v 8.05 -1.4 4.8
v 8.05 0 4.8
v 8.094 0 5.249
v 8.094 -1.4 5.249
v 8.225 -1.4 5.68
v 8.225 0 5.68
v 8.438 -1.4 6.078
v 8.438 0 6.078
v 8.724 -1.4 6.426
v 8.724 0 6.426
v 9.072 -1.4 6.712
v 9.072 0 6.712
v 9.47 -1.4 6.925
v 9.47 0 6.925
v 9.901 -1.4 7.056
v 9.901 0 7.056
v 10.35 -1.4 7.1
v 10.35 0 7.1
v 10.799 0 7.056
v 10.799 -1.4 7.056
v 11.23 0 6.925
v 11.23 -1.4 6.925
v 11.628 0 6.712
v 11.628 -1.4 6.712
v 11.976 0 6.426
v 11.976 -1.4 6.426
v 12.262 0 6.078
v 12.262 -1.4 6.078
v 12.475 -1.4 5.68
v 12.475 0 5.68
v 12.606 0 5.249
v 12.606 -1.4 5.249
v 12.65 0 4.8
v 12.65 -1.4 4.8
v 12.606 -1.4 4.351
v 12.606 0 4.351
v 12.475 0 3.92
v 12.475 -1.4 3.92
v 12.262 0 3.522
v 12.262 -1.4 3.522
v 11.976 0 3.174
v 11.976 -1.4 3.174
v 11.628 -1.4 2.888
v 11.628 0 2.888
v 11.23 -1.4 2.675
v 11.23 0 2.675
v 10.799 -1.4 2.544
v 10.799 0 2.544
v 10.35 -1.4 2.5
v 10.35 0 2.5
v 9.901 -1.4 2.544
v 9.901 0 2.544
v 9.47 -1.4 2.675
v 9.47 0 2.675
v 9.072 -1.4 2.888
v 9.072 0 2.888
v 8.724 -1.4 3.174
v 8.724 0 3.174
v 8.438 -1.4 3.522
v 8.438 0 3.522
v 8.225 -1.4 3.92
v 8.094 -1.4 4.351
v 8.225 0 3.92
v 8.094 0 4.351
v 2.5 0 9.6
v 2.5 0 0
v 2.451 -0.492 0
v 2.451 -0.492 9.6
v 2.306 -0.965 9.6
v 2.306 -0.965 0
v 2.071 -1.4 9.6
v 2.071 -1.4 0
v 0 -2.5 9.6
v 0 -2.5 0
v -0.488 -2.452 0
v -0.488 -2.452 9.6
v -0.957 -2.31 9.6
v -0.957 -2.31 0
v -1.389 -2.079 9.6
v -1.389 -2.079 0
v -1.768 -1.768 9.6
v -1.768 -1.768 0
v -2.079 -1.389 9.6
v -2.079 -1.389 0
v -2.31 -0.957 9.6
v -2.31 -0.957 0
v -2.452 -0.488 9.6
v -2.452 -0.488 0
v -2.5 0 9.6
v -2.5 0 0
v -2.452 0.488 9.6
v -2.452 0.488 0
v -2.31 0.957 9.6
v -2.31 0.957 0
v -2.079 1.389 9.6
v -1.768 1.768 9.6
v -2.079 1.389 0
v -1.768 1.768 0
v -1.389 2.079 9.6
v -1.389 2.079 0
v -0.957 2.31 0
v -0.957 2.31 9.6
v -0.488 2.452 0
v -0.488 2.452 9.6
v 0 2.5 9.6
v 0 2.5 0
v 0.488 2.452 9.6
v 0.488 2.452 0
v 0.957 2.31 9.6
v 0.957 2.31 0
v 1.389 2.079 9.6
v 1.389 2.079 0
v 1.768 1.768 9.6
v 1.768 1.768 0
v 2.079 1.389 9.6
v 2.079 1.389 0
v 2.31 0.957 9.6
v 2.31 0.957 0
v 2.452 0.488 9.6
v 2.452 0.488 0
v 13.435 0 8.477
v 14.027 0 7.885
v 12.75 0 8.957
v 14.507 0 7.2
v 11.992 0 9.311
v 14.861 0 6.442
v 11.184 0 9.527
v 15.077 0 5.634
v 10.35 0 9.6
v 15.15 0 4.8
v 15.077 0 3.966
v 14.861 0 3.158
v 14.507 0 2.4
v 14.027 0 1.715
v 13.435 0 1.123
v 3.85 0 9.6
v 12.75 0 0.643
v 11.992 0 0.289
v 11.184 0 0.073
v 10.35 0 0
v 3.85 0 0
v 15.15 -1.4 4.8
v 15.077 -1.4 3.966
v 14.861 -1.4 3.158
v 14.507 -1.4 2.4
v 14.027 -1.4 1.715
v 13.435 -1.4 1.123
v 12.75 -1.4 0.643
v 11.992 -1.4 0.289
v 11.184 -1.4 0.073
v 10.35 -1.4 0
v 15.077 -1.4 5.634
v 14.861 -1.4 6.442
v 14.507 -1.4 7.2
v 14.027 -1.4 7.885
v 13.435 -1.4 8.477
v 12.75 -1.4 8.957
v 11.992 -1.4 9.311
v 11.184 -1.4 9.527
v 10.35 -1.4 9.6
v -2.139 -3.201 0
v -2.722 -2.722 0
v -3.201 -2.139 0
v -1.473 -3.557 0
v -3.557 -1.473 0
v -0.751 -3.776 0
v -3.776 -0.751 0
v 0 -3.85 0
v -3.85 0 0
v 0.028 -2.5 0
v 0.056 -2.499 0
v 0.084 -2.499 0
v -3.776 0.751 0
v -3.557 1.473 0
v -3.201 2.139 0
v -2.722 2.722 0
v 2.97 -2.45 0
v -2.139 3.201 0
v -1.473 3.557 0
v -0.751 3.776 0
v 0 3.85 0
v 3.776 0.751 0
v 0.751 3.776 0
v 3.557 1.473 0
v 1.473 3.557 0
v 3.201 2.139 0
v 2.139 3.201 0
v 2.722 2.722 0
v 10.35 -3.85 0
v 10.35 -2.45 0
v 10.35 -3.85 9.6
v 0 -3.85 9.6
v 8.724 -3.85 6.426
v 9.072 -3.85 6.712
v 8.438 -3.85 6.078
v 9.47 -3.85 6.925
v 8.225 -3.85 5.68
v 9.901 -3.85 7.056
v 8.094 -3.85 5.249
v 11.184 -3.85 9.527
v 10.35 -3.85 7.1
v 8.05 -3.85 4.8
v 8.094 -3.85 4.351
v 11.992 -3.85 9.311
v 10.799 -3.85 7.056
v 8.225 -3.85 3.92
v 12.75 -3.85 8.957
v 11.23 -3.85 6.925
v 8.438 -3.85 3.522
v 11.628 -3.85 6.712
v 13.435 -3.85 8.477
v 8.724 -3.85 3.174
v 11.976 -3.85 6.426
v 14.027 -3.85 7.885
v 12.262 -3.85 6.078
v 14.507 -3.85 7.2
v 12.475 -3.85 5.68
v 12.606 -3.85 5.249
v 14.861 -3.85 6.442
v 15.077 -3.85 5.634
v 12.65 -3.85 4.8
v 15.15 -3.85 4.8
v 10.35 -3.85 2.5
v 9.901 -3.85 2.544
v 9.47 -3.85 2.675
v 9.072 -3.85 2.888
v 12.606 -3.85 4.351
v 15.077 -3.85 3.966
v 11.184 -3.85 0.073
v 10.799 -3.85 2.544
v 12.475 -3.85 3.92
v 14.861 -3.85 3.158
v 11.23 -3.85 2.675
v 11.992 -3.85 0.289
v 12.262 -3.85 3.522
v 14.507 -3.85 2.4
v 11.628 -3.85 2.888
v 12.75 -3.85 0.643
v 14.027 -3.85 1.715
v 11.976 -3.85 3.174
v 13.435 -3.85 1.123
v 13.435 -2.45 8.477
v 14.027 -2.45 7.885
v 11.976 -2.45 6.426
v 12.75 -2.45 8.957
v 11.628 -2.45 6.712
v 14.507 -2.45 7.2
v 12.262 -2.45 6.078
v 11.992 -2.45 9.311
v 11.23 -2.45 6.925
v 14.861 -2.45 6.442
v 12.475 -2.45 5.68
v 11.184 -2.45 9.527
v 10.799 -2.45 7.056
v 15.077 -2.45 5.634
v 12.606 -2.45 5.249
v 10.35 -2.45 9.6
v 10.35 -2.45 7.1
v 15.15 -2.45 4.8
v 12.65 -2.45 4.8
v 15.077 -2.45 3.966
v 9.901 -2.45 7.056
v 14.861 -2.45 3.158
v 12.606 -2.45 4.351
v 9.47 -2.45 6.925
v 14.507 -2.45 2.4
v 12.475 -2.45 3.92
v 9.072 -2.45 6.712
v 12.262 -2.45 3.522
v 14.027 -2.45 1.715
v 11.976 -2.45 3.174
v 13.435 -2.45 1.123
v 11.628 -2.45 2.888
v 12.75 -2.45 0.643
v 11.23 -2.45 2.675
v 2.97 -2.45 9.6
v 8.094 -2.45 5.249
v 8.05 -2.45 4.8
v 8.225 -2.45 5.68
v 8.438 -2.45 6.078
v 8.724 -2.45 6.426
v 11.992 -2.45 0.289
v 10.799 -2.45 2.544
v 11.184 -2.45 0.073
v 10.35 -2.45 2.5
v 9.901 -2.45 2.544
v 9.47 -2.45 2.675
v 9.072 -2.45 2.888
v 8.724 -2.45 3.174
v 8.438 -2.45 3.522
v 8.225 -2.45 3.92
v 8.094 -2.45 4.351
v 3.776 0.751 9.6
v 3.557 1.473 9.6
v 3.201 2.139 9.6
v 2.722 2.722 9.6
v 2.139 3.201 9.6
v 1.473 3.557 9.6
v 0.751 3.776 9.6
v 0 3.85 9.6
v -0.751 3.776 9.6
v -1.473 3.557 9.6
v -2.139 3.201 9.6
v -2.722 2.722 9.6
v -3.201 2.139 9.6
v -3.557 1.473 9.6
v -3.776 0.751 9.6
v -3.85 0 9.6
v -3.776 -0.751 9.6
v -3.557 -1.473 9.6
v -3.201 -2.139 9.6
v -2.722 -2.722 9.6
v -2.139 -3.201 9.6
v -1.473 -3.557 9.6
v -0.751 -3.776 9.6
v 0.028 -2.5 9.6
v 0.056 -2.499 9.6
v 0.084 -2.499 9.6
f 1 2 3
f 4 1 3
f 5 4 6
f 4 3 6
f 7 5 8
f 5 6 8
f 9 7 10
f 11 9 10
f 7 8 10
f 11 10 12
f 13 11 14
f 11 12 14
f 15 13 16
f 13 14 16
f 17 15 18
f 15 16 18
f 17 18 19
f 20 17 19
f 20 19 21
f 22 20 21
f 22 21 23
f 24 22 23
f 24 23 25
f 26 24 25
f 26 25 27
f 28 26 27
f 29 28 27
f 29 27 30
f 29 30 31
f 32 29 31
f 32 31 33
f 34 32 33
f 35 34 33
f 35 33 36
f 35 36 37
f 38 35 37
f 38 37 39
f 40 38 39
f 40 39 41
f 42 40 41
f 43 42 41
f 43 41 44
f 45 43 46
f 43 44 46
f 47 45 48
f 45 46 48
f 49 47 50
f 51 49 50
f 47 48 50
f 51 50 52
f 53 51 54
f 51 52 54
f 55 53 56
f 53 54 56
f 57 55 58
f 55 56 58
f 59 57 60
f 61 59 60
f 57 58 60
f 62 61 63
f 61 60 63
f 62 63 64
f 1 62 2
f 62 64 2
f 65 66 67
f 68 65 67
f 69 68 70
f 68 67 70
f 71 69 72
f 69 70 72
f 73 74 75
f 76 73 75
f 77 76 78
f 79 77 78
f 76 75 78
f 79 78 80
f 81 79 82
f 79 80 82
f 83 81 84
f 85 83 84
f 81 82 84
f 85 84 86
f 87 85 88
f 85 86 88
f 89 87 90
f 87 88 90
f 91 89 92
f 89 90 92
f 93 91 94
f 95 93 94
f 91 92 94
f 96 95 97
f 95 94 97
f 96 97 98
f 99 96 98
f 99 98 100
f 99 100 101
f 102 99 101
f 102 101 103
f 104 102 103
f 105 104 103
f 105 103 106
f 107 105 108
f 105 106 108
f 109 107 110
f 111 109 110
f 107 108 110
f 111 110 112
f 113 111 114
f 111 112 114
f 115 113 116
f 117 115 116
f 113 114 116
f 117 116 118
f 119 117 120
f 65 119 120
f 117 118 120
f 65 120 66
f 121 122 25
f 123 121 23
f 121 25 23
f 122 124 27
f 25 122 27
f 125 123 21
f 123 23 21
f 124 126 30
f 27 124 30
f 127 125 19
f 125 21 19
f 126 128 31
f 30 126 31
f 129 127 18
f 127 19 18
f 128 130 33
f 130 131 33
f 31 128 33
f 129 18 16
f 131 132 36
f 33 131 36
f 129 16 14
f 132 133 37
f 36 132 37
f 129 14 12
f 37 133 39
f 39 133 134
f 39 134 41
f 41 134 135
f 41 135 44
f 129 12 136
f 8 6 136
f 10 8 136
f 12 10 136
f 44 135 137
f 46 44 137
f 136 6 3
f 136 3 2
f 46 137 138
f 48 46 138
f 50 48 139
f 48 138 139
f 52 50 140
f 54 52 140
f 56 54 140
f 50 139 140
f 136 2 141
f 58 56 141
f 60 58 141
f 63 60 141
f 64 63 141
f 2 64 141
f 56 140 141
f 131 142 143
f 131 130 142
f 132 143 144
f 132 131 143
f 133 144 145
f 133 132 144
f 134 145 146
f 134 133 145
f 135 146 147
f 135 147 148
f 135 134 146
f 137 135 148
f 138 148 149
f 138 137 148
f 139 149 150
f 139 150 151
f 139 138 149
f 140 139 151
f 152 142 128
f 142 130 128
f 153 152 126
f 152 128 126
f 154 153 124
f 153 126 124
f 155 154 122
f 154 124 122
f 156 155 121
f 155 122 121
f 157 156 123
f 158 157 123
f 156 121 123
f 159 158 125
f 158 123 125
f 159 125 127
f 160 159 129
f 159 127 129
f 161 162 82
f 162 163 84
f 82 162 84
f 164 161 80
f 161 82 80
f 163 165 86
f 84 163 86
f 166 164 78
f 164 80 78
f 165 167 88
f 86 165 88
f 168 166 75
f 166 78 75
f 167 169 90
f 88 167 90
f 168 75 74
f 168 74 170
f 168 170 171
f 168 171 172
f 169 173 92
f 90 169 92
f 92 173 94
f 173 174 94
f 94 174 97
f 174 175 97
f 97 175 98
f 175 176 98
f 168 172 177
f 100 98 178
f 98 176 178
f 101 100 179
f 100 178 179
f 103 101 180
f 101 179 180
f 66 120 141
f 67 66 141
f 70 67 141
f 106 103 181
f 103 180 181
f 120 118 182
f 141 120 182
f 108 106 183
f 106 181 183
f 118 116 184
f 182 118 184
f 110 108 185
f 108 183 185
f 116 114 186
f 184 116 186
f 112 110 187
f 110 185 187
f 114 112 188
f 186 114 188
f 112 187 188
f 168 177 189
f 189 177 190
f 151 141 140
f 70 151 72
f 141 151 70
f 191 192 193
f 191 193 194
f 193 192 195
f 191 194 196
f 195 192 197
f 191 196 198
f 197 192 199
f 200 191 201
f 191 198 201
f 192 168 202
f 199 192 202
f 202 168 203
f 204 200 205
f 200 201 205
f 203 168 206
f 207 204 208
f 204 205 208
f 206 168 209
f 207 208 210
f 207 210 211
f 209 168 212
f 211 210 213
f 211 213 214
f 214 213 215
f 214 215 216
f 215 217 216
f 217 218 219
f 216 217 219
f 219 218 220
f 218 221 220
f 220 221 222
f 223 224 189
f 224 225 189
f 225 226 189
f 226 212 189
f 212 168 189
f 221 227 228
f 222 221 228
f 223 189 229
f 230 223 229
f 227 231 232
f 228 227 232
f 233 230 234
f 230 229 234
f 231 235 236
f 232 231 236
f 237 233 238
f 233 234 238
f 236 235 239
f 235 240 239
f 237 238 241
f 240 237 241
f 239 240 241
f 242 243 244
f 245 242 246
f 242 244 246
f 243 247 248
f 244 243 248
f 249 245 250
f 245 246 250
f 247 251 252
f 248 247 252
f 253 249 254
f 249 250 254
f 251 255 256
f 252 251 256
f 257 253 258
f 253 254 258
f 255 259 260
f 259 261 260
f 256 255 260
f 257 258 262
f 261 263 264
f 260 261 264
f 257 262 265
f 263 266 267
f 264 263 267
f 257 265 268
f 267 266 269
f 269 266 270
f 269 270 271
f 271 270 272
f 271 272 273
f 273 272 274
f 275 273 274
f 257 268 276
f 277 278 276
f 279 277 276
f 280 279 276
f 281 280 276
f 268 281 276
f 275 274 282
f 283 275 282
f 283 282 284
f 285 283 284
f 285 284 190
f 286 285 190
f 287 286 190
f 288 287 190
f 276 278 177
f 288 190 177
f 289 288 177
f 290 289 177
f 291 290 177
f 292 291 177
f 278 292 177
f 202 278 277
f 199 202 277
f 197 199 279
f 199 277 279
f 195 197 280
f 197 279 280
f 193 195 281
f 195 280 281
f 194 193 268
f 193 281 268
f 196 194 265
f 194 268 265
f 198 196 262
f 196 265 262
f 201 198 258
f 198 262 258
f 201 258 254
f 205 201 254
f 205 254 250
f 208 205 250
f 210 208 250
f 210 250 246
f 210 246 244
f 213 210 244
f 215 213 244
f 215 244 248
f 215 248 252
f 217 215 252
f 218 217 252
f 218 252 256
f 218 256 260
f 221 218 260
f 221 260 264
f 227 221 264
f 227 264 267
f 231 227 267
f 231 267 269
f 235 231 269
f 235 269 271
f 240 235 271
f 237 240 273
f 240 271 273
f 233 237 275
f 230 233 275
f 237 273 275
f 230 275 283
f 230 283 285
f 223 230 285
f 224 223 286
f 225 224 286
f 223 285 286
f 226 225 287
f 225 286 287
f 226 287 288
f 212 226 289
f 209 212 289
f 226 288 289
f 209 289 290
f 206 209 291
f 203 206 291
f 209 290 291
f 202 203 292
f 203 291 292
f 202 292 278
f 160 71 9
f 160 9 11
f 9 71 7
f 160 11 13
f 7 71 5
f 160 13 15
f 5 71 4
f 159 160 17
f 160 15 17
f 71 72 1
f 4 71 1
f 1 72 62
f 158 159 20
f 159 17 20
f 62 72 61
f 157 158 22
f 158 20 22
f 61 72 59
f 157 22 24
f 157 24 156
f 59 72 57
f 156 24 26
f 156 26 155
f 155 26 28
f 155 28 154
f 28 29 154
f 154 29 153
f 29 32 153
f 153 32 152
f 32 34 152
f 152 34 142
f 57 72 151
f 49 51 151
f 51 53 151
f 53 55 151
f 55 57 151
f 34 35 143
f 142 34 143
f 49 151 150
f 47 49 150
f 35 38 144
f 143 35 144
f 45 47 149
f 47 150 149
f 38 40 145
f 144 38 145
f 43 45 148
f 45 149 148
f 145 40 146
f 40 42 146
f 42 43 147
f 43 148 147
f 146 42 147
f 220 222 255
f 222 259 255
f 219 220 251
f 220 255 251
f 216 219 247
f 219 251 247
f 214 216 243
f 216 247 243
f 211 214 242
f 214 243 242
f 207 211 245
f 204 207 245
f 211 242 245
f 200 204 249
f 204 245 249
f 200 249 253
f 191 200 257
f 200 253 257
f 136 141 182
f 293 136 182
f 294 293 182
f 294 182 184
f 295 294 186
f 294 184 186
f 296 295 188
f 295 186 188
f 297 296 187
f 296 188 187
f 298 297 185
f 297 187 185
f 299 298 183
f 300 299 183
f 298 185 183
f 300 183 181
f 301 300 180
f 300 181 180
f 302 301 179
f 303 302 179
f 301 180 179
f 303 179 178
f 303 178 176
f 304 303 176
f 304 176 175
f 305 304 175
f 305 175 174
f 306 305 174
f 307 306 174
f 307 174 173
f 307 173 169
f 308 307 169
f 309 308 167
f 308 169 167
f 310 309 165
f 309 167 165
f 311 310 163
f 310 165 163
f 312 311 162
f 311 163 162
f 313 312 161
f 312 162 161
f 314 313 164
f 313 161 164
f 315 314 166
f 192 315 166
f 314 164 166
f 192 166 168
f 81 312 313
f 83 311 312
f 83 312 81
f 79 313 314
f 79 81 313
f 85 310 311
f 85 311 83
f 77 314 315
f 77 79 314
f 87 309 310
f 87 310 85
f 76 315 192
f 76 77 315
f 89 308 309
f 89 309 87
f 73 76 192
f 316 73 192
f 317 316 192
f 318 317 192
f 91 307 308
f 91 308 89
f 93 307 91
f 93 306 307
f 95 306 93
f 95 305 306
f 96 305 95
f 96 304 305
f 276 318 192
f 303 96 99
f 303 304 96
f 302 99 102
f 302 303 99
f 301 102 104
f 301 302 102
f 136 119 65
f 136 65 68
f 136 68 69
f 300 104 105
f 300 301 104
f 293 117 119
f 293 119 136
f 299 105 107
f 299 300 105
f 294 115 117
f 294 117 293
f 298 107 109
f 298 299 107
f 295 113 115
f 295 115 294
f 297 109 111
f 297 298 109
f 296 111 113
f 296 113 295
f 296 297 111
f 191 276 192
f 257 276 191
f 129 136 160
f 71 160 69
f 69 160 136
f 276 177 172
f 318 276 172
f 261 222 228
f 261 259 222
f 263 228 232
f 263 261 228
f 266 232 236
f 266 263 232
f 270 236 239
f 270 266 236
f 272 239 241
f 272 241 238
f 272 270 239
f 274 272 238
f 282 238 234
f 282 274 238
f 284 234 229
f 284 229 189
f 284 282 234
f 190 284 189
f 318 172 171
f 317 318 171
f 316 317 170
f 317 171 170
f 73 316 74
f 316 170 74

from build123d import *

# Parameters (mm, degrees)
BOSS_EXTRUDE1_DEPTH = 9.6
FILLET1_R           = 4.8
SKETCH2_R           = 2.3
CUT_EXTRUDE1_DEPTH  = 10


with BuildPart() as part:
    # Sketch1 → Boss-Extrude1 (new body)
    with BuildSketch(Plane.XY):
        with BuildLine():
            ThreePointArc((3.85, 0), (-2.722361108, 2.722361108), (0, -3.85))
            Line((0, -3.85), (15.15, -3.85))
            Line((15.15, -3.85), (15.15, -2.45))
            Line((15.15, -2.45), (2.969848481, -2.45))
            Line((2.969848481, -2.45), (0.084155525, -2.498583168))
            ThreePointArc((0.084155525, -2.498583168), (0.042083726, -2.499645767), (0, -2.5))
            ThreePointArc((0, -2.5), (-1.767766953, 1.767766953), (2.5, 0))
            ThreePointArc((2.5, 0), (2.390405697, -0.732093302), (2.071231518, -1.4))
            Line((2.071231518, -1.4), (15.15, -1.4))
            Line((15.15, -1.4), (15.15, 0))
            Line((15.15, 0), (3.85, 0))
        make_face()
    extrude(amount=BOSS_EXTRUDE1_DEPTH)

    # Fillet1
    fillet1_edges = [part.edges().sort_by_distance(p)[0] for p in [
        (15.15, -0.7, 0),
        (15.15, -0.7, 9.6),
        (15.15, -3.15, 0),
        (15.15, -3.15, 9.6),
    ]]
    fillet(fillet1_edges, radius=FILLET1_R - 0.0001)  # a hair under: the kernel refuses the full size

    # Sketch2 → Cut-Extrude1 (cut)
    with BuildSketch(Plane(origin=(0, 0, 0), x_dir=(1, 0, 0), z_dir=(0, 1, 0))):
        with Locations(Location((10.35, -4.8, 0), (0, 0, 180))):
            Circle(SKETCH2_R)
    extrude(amount=-CUT_EXTRUDE1_DEPTH, mode=Mode.SUBTRACT)


solid = part.part
